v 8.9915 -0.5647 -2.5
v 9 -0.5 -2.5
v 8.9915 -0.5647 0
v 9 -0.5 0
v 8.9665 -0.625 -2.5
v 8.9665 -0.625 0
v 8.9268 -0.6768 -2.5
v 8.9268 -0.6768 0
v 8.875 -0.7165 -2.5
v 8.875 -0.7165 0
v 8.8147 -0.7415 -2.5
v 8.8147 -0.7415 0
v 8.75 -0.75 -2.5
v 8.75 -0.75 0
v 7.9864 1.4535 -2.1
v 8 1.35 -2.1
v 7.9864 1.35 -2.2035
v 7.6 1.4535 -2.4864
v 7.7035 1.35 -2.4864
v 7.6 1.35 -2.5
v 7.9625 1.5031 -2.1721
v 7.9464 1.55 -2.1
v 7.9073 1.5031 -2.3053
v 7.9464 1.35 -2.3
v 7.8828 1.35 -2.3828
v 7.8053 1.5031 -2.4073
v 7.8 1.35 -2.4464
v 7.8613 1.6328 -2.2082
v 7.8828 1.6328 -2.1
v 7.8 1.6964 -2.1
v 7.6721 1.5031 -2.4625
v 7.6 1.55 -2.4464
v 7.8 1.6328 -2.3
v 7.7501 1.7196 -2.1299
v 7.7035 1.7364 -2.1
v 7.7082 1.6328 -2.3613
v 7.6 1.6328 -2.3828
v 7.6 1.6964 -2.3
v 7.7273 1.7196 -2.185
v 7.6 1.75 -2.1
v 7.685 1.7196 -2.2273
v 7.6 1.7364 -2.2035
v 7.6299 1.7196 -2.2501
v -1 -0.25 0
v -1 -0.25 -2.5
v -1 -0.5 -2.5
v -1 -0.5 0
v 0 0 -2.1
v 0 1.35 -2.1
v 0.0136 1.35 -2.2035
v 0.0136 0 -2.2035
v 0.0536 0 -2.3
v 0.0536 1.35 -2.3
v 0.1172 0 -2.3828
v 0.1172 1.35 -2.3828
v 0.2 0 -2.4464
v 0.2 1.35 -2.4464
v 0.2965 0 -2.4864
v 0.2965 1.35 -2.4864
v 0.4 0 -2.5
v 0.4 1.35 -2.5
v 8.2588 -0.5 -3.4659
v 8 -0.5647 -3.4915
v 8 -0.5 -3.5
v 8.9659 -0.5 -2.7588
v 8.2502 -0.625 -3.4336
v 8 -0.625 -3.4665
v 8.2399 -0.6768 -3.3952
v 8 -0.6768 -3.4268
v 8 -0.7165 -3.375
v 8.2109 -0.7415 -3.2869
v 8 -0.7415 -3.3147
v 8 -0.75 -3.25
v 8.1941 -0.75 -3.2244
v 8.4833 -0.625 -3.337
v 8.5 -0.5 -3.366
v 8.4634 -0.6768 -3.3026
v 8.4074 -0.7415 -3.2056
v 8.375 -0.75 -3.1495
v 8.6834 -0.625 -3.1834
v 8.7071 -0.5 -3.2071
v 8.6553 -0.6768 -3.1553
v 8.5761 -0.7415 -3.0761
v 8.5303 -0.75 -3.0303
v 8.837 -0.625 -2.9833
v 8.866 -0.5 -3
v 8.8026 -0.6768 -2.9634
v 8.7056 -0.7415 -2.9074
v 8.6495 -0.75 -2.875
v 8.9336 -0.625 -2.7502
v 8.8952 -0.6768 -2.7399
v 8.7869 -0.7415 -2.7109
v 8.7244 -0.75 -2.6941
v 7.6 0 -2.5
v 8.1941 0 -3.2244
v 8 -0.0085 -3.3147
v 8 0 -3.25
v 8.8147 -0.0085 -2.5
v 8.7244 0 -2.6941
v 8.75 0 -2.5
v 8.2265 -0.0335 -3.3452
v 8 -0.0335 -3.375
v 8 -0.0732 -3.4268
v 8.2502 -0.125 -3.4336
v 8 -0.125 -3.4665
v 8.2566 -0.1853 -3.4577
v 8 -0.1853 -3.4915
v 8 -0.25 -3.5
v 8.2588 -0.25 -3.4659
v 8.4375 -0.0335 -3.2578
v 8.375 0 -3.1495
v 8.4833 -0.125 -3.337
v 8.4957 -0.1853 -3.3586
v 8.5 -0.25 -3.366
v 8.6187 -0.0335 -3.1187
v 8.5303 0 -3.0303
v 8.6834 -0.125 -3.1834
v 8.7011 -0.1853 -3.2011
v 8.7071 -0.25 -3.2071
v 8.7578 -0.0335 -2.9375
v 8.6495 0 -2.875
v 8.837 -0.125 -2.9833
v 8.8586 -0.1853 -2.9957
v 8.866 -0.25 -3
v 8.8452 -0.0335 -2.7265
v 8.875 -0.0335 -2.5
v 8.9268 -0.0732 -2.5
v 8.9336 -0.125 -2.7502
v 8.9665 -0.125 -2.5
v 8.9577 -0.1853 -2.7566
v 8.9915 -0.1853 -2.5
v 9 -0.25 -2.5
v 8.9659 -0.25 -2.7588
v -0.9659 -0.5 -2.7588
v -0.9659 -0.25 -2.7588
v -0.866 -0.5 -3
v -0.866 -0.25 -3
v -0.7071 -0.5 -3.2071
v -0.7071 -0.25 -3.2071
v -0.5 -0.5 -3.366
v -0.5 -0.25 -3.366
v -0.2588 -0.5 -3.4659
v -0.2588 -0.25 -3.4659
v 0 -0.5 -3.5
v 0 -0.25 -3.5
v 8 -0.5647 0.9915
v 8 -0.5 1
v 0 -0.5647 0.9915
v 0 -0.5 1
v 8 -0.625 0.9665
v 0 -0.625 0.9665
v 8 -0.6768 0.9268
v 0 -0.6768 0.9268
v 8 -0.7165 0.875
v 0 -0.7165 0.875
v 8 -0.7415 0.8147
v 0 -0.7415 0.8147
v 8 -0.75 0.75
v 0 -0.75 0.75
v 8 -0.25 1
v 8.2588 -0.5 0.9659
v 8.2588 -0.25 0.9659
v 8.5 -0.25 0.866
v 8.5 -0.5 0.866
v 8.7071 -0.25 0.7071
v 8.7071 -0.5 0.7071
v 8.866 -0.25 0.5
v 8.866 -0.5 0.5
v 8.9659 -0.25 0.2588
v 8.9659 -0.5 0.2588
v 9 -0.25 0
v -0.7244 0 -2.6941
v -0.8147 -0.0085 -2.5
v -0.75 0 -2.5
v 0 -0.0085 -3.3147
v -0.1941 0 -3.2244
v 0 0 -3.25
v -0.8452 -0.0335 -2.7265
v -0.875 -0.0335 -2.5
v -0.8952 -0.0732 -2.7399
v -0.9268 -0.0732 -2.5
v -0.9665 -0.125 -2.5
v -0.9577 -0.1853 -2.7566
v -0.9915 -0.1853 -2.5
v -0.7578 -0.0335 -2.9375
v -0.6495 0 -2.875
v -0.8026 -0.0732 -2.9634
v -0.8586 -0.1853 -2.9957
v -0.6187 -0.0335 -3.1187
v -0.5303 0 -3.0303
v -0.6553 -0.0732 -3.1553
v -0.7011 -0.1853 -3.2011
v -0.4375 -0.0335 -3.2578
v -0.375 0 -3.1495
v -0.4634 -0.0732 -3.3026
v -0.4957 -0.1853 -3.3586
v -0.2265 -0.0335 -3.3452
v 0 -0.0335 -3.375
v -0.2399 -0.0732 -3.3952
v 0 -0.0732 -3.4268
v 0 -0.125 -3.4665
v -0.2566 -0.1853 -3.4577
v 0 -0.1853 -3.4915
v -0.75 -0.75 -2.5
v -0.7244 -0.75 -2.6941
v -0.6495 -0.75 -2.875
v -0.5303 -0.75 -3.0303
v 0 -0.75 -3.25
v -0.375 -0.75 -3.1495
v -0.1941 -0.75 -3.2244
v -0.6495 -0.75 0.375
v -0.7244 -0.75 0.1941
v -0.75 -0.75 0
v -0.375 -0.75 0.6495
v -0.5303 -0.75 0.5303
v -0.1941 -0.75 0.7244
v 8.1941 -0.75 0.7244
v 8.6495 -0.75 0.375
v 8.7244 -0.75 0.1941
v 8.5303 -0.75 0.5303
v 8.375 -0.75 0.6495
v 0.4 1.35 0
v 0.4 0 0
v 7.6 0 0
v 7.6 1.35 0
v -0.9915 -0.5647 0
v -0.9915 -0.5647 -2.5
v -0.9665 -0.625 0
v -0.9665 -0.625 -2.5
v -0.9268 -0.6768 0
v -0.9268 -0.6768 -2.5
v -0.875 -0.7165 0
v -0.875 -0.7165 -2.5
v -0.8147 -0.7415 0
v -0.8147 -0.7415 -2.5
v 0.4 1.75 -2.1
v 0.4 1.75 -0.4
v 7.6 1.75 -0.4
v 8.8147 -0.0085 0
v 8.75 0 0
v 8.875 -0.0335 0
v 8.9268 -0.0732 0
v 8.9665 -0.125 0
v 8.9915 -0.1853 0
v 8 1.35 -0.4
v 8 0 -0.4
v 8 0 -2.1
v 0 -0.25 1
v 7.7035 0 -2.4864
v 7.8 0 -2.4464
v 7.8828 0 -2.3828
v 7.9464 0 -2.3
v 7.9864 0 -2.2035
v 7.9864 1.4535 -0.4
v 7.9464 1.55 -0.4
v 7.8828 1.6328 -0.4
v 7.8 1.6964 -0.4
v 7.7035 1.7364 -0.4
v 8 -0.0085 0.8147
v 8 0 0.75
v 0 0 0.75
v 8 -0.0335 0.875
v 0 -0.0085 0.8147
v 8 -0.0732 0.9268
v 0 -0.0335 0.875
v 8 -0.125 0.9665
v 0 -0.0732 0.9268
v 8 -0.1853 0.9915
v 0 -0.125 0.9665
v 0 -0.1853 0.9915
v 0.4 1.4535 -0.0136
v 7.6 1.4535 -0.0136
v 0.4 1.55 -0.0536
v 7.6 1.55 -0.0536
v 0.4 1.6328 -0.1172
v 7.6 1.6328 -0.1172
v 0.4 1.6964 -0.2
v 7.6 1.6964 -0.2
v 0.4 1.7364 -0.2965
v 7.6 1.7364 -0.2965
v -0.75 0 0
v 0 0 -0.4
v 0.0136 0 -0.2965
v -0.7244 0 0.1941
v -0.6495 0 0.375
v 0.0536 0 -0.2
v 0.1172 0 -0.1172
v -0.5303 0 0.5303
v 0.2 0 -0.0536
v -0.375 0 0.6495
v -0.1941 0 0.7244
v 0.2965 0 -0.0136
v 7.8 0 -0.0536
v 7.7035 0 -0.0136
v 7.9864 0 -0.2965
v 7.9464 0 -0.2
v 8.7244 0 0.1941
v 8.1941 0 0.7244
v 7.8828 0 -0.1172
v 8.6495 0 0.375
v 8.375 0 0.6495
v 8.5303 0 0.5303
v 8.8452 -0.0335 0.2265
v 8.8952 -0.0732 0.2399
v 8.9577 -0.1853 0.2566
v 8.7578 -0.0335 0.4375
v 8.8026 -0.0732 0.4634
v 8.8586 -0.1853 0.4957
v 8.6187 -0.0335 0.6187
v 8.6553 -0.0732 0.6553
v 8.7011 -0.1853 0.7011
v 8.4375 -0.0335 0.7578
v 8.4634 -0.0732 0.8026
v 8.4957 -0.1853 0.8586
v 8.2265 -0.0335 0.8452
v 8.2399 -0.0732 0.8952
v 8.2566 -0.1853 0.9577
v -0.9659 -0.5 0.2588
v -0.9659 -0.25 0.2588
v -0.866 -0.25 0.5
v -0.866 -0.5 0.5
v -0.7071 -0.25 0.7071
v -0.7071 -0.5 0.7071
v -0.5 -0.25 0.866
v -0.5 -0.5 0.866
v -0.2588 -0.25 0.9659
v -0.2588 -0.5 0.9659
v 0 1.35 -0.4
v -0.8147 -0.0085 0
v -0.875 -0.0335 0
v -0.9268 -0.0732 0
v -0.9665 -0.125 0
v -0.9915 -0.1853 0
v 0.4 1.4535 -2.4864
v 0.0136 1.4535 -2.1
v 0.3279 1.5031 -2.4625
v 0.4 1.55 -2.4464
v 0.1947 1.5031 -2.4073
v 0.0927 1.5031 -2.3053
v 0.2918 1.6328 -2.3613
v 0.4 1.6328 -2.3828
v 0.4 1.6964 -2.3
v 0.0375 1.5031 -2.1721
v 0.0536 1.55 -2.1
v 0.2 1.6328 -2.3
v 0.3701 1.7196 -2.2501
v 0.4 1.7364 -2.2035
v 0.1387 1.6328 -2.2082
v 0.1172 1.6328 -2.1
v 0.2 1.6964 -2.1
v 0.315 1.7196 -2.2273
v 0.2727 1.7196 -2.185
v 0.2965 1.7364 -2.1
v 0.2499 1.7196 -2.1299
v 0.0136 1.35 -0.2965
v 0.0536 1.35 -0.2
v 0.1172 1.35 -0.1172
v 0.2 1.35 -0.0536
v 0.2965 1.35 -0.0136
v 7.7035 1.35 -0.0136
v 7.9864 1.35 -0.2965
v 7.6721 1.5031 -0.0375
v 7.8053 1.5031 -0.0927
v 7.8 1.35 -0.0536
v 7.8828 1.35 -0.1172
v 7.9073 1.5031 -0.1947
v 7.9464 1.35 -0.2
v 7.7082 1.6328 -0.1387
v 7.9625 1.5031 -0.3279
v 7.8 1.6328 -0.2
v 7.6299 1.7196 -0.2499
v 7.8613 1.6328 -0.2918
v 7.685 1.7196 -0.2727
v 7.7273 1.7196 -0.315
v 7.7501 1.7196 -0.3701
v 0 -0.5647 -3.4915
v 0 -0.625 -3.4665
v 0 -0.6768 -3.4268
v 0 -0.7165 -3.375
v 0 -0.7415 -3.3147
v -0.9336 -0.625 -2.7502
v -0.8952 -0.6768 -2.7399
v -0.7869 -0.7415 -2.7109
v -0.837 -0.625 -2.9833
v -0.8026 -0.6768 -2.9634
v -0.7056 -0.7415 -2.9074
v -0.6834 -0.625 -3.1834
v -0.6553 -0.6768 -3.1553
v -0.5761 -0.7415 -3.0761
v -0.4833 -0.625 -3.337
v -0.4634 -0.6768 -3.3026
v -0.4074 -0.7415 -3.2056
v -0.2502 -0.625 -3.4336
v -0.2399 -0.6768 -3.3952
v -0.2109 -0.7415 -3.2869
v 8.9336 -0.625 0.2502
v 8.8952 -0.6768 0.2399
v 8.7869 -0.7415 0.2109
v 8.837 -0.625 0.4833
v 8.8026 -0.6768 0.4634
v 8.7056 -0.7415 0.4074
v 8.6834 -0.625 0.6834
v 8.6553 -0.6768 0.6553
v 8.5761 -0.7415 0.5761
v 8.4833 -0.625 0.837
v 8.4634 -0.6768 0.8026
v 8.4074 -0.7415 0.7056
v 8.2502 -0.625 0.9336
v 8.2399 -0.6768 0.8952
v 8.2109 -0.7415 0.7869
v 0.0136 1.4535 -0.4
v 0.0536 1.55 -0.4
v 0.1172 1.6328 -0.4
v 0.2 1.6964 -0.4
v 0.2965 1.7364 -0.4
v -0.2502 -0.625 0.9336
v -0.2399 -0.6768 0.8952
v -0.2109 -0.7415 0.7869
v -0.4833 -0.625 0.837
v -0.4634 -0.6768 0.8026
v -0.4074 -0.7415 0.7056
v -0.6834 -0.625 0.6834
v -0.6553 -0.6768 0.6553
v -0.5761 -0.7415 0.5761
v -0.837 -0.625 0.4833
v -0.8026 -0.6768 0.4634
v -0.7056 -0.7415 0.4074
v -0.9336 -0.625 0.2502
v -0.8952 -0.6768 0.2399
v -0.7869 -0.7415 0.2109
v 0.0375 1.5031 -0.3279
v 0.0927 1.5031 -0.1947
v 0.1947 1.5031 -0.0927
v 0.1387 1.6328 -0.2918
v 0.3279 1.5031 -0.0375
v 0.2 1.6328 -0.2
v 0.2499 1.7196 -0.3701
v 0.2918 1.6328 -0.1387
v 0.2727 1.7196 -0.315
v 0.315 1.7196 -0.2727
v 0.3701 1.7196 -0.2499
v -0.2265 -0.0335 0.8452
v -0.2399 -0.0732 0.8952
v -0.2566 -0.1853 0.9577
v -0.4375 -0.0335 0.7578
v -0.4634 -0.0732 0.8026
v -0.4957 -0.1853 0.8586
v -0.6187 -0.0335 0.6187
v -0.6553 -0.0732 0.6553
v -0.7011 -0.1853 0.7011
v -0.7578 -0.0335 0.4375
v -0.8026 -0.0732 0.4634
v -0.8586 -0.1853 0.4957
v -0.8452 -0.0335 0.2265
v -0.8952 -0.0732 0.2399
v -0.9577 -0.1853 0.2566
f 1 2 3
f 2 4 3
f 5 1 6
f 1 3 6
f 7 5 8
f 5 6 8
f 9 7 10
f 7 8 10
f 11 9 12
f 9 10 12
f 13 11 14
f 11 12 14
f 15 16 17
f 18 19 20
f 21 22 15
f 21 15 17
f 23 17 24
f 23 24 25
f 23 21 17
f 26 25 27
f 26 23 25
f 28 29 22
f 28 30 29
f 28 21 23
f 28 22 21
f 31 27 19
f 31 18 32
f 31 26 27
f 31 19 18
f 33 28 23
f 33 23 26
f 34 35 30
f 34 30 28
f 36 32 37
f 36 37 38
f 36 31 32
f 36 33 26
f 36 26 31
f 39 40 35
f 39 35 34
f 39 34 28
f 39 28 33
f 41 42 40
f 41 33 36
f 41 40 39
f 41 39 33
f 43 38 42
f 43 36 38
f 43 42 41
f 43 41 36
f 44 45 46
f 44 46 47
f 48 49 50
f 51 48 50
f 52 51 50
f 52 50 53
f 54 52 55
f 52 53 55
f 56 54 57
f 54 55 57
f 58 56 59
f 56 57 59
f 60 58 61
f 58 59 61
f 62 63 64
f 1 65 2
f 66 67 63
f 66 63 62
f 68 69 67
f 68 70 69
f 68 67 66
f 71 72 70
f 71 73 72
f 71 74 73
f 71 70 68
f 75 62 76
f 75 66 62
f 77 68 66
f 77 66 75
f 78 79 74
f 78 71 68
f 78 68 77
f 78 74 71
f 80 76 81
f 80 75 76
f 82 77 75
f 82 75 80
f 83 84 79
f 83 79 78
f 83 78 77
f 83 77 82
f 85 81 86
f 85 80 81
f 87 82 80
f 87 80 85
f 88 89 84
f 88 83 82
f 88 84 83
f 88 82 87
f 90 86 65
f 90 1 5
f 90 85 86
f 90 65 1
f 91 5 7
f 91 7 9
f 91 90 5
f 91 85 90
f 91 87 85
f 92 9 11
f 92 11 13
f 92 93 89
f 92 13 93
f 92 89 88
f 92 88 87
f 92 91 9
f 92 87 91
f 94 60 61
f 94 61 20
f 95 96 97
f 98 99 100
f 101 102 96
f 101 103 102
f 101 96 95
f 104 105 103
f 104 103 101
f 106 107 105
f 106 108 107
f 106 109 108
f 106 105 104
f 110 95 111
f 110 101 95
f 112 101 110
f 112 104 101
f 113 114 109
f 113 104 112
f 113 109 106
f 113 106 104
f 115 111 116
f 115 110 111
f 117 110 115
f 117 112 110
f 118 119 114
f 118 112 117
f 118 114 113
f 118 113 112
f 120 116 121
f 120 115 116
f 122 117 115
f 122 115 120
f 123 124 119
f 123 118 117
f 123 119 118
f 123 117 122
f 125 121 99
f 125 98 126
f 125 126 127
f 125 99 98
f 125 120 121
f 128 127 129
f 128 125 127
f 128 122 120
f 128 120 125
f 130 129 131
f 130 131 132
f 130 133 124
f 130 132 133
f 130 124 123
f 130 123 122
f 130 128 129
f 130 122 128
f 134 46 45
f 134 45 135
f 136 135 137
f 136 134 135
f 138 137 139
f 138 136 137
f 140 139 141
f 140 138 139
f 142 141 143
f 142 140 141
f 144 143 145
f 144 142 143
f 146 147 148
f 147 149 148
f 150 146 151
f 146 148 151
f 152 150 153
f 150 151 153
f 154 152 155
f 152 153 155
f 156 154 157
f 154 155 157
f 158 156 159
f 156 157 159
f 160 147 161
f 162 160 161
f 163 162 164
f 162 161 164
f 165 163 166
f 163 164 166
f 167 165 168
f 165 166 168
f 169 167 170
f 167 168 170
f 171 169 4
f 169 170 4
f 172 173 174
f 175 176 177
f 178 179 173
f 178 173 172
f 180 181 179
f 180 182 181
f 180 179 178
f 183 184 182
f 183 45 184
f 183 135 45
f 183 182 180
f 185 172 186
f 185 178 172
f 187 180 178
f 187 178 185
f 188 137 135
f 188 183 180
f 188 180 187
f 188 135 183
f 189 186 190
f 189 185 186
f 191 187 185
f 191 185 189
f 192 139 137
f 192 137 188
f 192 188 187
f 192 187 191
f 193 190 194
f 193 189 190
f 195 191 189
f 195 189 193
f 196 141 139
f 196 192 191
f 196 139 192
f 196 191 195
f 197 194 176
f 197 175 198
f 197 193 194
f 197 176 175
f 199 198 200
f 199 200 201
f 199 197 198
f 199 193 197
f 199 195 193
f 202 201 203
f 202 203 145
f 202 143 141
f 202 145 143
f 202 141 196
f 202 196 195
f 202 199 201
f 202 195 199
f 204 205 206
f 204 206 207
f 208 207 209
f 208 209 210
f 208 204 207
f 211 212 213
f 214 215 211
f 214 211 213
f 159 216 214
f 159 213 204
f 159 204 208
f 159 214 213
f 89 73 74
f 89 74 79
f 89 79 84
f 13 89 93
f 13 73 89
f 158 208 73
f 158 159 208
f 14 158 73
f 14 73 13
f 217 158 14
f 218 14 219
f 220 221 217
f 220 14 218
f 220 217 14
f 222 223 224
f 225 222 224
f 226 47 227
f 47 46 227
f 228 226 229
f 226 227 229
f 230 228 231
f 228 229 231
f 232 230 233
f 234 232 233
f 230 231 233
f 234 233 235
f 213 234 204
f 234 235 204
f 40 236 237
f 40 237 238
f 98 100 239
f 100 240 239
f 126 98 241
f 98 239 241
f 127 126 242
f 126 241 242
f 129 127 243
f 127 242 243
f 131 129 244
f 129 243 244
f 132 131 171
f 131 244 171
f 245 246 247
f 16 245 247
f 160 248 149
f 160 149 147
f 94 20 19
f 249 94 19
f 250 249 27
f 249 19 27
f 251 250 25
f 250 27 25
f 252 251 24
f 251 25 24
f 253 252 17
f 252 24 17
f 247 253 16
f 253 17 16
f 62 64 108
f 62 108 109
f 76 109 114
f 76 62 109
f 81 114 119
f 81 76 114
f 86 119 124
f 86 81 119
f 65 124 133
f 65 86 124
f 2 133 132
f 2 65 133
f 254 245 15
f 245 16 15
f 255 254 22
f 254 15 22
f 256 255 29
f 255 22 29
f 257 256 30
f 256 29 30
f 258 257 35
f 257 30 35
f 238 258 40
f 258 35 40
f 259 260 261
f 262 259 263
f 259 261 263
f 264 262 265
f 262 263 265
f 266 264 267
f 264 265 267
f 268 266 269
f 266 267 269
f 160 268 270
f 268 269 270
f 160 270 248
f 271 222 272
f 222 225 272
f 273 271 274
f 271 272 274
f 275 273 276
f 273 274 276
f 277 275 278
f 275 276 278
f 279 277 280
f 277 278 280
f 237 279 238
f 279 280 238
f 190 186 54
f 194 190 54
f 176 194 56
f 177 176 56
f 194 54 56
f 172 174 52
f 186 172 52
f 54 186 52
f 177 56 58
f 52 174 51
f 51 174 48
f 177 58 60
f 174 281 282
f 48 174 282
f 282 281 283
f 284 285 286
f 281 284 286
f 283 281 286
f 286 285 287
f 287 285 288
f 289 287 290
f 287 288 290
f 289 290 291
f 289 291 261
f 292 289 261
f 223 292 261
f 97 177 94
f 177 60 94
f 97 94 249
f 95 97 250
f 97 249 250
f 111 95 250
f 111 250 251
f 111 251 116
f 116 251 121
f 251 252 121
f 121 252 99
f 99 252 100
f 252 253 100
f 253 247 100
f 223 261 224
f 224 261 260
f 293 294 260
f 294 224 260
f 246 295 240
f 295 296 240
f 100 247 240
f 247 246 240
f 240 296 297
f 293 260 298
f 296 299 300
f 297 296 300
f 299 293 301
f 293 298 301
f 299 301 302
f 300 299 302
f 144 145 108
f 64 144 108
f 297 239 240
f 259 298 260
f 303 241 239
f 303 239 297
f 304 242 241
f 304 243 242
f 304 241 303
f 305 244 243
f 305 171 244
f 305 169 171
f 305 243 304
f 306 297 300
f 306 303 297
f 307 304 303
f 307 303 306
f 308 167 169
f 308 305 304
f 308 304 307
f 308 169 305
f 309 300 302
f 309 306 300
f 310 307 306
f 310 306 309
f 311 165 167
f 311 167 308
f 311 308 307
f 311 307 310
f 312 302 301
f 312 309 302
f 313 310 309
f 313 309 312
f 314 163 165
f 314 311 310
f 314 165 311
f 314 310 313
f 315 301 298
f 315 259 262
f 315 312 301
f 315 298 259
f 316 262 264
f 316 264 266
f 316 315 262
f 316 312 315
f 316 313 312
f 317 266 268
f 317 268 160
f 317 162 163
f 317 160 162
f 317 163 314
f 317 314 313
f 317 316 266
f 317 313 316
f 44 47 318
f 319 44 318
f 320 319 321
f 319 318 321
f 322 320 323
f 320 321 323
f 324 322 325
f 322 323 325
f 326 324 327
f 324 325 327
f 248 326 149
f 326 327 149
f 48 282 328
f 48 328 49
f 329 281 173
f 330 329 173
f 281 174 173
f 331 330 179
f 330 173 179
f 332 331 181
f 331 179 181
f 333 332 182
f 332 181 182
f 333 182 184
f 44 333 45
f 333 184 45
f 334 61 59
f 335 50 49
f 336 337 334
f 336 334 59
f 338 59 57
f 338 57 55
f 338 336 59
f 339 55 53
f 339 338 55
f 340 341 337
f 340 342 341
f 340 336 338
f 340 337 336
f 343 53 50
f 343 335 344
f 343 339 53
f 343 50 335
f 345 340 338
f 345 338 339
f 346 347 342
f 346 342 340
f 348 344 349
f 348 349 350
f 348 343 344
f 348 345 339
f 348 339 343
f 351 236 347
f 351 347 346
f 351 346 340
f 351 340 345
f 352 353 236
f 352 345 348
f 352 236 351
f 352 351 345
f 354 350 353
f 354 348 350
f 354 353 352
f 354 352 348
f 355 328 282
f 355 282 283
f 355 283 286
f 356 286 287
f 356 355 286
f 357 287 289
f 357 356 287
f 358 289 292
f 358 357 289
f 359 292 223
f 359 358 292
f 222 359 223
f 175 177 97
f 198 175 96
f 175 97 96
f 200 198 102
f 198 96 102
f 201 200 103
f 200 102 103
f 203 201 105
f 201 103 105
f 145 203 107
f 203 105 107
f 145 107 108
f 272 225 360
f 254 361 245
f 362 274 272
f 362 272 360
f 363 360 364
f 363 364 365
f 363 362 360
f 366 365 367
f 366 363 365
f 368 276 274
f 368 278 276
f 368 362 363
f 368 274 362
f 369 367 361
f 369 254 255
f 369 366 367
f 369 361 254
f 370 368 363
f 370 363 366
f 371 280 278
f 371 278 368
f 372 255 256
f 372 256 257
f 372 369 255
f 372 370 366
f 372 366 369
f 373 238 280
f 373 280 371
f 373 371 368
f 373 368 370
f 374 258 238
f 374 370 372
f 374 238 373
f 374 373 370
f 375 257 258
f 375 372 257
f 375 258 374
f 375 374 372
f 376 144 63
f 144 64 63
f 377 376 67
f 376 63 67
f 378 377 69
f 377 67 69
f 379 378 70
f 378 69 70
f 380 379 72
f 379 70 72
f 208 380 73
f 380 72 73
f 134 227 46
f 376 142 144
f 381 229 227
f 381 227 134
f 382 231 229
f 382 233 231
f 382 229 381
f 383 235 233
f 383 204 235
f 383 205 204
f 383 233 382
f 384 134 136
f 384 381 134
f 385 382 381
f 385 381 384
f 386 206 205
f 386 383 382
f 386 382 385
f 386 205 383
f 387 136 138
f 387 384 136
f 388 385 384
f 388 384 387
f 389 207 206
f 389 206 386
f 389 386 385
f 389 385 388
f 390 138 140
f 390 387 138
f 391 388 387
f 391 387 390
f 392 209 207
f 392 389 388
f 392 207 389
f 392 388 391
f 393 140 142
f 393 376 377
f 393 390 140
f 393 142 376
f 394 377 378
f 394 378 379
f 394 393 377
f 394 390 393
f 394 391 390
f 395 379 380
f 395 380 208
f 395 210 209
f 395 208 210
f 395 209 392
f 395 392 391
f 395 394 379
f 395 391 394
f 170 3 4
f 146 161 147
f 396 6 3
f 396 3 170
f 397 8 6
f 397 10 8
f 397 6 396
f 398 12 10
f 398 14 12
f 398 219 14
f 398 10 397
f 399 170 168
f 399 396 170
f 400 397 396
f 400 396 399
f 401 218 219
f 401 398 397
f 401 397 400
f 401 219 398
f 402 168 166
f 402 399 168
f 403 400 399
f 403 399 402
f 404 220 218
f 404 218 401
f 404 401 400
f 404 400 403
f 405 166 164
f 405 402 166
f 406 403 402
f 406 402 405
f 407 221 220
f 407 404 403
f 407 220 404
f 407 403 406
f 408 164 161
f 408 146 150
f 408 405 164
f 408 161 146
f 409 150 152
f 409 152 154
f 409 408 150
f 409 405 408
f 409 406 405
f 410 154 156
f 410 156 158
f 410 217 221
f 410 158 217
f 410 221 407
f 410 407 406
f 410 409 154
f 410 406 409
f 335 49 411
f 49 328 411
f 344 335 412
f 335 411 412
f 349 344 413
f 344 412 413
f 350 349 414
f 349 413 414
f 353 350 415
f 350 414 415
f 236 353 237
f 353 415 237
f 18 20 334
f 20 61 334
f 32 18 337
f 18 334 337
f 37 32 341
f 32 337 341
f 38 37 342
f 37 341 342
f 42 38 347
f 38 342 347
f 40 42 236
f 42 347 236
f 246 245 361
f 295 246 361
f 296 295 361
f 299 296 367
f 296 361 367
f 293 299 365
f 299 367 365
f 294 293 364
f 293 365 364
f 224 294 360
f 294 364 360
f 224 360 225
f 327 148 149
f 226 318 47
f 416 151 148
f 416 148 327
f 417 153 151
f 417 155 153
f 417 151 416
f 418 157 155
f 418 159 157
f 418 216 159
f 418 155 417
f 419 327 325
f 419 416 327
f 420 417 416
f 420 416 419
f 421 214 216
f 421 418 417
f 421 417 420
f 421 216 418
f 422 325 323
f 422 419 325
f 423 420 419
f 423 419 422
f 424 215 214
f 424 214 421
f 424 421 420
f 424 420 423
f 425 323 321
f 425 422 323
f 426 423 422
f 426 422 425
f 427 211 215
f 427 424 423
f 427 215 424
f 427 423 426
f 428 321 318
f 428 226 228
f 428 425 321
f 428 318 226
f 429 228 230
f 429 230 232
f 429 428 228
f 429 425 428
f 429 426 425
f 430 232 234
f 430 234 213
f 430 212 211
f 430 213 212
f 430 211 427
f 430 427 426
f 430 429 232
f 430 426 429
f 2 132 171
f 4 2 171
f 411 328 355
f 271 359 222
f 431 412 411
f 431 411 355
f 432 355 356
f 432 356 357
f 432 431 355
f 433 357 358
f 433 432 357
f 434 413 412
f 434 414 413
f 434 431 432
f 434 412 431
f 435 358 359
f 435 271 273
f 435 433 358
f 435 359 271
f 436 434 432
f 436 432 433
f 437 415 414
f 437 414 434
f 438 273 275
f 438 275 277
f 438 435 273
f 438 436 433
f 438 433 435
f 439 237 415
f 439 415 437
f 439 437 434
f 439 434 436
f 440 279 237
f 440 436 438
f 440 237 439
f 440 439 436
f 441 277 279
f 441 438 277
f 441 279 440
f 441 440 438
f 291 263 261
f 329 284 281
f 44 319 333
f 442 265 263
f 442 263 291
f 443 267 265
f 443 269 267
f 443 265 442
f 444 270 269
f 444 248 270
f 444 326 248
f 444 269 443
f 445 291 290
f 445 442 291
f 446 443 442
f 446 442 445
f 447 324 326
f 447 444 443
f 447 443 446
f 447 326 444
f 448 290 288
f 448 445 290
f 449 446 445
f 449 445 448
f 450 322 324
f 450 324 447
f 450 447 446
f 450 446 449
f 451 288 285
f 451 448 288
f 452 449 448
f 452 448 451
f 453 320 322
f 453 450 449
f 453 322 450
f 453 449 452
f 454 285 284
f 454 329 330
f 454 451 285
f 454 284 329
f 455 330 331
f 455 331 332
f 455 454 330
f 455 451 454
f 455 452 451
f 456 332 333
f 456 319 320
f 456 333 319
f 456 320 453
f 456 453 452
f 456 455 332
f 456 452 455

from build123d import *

# Parameters (mm, degrees)
SKETCH1_W           = 8
SKETCH1_H           = 2.5
BOSS_EXTRUDE1_DEPTH = 1.75
SKETCH2_W           = 10
SKETCH2_H           = 4.5
BOSS_EXTRUDE2_DEPTH = 0.75
FILLET1_R           = 0.4
FILLET2_R           = 0.4
FILLET3_R           = 1
FILLET4_R           = 0.25


with BuildPart() as part:
    # Sketch1 → Boss-Extrude1 (new body)
    with BuildSketch(Plane(origin=(0, 0, 0), x_dir=(1, 0, 0), z_dir=(0, 1, 0))):
        with Locations((4, 1.25)):
            Rectangle(SKETCH1_W, SKETCH1_H)
    extrude(amount=BOSS_EXTRUDE1_DEPTH)

    # Sketch2 → Boss-Extrude2 (add)
    with BuildSketch(Plane.XZ):
        with Locations((4, -1.25)):
            Rectangle(SKETCH2_W, SKETCH2_H)
    extrude(amount=BOSS_EXTRUDE2_DEPTH)

    # Fillet1
    fillet1_edges = [part.edges().sort_by_distance(p)[0] for p in [
        (0, 0.875, -2.5),
        (0, 0.875, 0),
        (8, 0.875, 0),
        (8, 0.875, -2.5),
    ]]
    fillet(fillet1_edges, radius=FILLET1_R)

    # Fillet2
    fillet2_edges = [part.edges().sort_by_distance(p)[0] for p in [
        (8, 1.75, -1.25),
        (4, 1.75, 0),
        (4, 1.75, -2.5),
        (0, 1.75, -1.25),
        (0.117157288, 1.75, -0.117157288),
        (0.117157288, 1.75, -2.382842712),
        (7.882842712, 1.75, -2.382842712),
        (7.882842712, 1.75, -0.117157288),
    ]]
    fillet(fillet2_edges, radius=FILLET2_R)

    # Fillet3
    fillet3_edges = [part.edges().sort_by_distance(p)[0] for p in [
        (-1, -0.375, 1),
        (-1, -0.375, -3.5),
        (9, -0.375, -3.5),
        (9, -0.375, 1),
    ]]
    fillet(fillet3_edges, radius=FILLET3_R)

    # Fillet4
    fillet4_edges = [part.edges().sort_by_distance(p)[0] for p in [
        (9, 0, -1.25),
        (9, -0.75, -1.25),
        (-1, 0, -1.25),
        (4, 0, 1),
        (4, 0, -3.5),
        (8.707106781, 0, 0.707106781),
        (-0.7071067811865478, 0, 0.7071067811865477),
        (-0.707106781, 0, -3.207106781),
        (8.707106781, 0, -3.207106781),
        (4, -0.75, -3.5),
        (-1, -0.75, -1.25),
        (4, -0.75, 1),
        (8.707106781, -0.75, 0.707106781),
        (-0.707106781, -0.75, 0.707106781),
        (-0.707106781, -0.75, -3.207106781),
        (8.707106781, -0.75, -3.207106781),
    ]]
    fillet(fillet4_edges, radius=FILLET4_R)


solid = part.part
